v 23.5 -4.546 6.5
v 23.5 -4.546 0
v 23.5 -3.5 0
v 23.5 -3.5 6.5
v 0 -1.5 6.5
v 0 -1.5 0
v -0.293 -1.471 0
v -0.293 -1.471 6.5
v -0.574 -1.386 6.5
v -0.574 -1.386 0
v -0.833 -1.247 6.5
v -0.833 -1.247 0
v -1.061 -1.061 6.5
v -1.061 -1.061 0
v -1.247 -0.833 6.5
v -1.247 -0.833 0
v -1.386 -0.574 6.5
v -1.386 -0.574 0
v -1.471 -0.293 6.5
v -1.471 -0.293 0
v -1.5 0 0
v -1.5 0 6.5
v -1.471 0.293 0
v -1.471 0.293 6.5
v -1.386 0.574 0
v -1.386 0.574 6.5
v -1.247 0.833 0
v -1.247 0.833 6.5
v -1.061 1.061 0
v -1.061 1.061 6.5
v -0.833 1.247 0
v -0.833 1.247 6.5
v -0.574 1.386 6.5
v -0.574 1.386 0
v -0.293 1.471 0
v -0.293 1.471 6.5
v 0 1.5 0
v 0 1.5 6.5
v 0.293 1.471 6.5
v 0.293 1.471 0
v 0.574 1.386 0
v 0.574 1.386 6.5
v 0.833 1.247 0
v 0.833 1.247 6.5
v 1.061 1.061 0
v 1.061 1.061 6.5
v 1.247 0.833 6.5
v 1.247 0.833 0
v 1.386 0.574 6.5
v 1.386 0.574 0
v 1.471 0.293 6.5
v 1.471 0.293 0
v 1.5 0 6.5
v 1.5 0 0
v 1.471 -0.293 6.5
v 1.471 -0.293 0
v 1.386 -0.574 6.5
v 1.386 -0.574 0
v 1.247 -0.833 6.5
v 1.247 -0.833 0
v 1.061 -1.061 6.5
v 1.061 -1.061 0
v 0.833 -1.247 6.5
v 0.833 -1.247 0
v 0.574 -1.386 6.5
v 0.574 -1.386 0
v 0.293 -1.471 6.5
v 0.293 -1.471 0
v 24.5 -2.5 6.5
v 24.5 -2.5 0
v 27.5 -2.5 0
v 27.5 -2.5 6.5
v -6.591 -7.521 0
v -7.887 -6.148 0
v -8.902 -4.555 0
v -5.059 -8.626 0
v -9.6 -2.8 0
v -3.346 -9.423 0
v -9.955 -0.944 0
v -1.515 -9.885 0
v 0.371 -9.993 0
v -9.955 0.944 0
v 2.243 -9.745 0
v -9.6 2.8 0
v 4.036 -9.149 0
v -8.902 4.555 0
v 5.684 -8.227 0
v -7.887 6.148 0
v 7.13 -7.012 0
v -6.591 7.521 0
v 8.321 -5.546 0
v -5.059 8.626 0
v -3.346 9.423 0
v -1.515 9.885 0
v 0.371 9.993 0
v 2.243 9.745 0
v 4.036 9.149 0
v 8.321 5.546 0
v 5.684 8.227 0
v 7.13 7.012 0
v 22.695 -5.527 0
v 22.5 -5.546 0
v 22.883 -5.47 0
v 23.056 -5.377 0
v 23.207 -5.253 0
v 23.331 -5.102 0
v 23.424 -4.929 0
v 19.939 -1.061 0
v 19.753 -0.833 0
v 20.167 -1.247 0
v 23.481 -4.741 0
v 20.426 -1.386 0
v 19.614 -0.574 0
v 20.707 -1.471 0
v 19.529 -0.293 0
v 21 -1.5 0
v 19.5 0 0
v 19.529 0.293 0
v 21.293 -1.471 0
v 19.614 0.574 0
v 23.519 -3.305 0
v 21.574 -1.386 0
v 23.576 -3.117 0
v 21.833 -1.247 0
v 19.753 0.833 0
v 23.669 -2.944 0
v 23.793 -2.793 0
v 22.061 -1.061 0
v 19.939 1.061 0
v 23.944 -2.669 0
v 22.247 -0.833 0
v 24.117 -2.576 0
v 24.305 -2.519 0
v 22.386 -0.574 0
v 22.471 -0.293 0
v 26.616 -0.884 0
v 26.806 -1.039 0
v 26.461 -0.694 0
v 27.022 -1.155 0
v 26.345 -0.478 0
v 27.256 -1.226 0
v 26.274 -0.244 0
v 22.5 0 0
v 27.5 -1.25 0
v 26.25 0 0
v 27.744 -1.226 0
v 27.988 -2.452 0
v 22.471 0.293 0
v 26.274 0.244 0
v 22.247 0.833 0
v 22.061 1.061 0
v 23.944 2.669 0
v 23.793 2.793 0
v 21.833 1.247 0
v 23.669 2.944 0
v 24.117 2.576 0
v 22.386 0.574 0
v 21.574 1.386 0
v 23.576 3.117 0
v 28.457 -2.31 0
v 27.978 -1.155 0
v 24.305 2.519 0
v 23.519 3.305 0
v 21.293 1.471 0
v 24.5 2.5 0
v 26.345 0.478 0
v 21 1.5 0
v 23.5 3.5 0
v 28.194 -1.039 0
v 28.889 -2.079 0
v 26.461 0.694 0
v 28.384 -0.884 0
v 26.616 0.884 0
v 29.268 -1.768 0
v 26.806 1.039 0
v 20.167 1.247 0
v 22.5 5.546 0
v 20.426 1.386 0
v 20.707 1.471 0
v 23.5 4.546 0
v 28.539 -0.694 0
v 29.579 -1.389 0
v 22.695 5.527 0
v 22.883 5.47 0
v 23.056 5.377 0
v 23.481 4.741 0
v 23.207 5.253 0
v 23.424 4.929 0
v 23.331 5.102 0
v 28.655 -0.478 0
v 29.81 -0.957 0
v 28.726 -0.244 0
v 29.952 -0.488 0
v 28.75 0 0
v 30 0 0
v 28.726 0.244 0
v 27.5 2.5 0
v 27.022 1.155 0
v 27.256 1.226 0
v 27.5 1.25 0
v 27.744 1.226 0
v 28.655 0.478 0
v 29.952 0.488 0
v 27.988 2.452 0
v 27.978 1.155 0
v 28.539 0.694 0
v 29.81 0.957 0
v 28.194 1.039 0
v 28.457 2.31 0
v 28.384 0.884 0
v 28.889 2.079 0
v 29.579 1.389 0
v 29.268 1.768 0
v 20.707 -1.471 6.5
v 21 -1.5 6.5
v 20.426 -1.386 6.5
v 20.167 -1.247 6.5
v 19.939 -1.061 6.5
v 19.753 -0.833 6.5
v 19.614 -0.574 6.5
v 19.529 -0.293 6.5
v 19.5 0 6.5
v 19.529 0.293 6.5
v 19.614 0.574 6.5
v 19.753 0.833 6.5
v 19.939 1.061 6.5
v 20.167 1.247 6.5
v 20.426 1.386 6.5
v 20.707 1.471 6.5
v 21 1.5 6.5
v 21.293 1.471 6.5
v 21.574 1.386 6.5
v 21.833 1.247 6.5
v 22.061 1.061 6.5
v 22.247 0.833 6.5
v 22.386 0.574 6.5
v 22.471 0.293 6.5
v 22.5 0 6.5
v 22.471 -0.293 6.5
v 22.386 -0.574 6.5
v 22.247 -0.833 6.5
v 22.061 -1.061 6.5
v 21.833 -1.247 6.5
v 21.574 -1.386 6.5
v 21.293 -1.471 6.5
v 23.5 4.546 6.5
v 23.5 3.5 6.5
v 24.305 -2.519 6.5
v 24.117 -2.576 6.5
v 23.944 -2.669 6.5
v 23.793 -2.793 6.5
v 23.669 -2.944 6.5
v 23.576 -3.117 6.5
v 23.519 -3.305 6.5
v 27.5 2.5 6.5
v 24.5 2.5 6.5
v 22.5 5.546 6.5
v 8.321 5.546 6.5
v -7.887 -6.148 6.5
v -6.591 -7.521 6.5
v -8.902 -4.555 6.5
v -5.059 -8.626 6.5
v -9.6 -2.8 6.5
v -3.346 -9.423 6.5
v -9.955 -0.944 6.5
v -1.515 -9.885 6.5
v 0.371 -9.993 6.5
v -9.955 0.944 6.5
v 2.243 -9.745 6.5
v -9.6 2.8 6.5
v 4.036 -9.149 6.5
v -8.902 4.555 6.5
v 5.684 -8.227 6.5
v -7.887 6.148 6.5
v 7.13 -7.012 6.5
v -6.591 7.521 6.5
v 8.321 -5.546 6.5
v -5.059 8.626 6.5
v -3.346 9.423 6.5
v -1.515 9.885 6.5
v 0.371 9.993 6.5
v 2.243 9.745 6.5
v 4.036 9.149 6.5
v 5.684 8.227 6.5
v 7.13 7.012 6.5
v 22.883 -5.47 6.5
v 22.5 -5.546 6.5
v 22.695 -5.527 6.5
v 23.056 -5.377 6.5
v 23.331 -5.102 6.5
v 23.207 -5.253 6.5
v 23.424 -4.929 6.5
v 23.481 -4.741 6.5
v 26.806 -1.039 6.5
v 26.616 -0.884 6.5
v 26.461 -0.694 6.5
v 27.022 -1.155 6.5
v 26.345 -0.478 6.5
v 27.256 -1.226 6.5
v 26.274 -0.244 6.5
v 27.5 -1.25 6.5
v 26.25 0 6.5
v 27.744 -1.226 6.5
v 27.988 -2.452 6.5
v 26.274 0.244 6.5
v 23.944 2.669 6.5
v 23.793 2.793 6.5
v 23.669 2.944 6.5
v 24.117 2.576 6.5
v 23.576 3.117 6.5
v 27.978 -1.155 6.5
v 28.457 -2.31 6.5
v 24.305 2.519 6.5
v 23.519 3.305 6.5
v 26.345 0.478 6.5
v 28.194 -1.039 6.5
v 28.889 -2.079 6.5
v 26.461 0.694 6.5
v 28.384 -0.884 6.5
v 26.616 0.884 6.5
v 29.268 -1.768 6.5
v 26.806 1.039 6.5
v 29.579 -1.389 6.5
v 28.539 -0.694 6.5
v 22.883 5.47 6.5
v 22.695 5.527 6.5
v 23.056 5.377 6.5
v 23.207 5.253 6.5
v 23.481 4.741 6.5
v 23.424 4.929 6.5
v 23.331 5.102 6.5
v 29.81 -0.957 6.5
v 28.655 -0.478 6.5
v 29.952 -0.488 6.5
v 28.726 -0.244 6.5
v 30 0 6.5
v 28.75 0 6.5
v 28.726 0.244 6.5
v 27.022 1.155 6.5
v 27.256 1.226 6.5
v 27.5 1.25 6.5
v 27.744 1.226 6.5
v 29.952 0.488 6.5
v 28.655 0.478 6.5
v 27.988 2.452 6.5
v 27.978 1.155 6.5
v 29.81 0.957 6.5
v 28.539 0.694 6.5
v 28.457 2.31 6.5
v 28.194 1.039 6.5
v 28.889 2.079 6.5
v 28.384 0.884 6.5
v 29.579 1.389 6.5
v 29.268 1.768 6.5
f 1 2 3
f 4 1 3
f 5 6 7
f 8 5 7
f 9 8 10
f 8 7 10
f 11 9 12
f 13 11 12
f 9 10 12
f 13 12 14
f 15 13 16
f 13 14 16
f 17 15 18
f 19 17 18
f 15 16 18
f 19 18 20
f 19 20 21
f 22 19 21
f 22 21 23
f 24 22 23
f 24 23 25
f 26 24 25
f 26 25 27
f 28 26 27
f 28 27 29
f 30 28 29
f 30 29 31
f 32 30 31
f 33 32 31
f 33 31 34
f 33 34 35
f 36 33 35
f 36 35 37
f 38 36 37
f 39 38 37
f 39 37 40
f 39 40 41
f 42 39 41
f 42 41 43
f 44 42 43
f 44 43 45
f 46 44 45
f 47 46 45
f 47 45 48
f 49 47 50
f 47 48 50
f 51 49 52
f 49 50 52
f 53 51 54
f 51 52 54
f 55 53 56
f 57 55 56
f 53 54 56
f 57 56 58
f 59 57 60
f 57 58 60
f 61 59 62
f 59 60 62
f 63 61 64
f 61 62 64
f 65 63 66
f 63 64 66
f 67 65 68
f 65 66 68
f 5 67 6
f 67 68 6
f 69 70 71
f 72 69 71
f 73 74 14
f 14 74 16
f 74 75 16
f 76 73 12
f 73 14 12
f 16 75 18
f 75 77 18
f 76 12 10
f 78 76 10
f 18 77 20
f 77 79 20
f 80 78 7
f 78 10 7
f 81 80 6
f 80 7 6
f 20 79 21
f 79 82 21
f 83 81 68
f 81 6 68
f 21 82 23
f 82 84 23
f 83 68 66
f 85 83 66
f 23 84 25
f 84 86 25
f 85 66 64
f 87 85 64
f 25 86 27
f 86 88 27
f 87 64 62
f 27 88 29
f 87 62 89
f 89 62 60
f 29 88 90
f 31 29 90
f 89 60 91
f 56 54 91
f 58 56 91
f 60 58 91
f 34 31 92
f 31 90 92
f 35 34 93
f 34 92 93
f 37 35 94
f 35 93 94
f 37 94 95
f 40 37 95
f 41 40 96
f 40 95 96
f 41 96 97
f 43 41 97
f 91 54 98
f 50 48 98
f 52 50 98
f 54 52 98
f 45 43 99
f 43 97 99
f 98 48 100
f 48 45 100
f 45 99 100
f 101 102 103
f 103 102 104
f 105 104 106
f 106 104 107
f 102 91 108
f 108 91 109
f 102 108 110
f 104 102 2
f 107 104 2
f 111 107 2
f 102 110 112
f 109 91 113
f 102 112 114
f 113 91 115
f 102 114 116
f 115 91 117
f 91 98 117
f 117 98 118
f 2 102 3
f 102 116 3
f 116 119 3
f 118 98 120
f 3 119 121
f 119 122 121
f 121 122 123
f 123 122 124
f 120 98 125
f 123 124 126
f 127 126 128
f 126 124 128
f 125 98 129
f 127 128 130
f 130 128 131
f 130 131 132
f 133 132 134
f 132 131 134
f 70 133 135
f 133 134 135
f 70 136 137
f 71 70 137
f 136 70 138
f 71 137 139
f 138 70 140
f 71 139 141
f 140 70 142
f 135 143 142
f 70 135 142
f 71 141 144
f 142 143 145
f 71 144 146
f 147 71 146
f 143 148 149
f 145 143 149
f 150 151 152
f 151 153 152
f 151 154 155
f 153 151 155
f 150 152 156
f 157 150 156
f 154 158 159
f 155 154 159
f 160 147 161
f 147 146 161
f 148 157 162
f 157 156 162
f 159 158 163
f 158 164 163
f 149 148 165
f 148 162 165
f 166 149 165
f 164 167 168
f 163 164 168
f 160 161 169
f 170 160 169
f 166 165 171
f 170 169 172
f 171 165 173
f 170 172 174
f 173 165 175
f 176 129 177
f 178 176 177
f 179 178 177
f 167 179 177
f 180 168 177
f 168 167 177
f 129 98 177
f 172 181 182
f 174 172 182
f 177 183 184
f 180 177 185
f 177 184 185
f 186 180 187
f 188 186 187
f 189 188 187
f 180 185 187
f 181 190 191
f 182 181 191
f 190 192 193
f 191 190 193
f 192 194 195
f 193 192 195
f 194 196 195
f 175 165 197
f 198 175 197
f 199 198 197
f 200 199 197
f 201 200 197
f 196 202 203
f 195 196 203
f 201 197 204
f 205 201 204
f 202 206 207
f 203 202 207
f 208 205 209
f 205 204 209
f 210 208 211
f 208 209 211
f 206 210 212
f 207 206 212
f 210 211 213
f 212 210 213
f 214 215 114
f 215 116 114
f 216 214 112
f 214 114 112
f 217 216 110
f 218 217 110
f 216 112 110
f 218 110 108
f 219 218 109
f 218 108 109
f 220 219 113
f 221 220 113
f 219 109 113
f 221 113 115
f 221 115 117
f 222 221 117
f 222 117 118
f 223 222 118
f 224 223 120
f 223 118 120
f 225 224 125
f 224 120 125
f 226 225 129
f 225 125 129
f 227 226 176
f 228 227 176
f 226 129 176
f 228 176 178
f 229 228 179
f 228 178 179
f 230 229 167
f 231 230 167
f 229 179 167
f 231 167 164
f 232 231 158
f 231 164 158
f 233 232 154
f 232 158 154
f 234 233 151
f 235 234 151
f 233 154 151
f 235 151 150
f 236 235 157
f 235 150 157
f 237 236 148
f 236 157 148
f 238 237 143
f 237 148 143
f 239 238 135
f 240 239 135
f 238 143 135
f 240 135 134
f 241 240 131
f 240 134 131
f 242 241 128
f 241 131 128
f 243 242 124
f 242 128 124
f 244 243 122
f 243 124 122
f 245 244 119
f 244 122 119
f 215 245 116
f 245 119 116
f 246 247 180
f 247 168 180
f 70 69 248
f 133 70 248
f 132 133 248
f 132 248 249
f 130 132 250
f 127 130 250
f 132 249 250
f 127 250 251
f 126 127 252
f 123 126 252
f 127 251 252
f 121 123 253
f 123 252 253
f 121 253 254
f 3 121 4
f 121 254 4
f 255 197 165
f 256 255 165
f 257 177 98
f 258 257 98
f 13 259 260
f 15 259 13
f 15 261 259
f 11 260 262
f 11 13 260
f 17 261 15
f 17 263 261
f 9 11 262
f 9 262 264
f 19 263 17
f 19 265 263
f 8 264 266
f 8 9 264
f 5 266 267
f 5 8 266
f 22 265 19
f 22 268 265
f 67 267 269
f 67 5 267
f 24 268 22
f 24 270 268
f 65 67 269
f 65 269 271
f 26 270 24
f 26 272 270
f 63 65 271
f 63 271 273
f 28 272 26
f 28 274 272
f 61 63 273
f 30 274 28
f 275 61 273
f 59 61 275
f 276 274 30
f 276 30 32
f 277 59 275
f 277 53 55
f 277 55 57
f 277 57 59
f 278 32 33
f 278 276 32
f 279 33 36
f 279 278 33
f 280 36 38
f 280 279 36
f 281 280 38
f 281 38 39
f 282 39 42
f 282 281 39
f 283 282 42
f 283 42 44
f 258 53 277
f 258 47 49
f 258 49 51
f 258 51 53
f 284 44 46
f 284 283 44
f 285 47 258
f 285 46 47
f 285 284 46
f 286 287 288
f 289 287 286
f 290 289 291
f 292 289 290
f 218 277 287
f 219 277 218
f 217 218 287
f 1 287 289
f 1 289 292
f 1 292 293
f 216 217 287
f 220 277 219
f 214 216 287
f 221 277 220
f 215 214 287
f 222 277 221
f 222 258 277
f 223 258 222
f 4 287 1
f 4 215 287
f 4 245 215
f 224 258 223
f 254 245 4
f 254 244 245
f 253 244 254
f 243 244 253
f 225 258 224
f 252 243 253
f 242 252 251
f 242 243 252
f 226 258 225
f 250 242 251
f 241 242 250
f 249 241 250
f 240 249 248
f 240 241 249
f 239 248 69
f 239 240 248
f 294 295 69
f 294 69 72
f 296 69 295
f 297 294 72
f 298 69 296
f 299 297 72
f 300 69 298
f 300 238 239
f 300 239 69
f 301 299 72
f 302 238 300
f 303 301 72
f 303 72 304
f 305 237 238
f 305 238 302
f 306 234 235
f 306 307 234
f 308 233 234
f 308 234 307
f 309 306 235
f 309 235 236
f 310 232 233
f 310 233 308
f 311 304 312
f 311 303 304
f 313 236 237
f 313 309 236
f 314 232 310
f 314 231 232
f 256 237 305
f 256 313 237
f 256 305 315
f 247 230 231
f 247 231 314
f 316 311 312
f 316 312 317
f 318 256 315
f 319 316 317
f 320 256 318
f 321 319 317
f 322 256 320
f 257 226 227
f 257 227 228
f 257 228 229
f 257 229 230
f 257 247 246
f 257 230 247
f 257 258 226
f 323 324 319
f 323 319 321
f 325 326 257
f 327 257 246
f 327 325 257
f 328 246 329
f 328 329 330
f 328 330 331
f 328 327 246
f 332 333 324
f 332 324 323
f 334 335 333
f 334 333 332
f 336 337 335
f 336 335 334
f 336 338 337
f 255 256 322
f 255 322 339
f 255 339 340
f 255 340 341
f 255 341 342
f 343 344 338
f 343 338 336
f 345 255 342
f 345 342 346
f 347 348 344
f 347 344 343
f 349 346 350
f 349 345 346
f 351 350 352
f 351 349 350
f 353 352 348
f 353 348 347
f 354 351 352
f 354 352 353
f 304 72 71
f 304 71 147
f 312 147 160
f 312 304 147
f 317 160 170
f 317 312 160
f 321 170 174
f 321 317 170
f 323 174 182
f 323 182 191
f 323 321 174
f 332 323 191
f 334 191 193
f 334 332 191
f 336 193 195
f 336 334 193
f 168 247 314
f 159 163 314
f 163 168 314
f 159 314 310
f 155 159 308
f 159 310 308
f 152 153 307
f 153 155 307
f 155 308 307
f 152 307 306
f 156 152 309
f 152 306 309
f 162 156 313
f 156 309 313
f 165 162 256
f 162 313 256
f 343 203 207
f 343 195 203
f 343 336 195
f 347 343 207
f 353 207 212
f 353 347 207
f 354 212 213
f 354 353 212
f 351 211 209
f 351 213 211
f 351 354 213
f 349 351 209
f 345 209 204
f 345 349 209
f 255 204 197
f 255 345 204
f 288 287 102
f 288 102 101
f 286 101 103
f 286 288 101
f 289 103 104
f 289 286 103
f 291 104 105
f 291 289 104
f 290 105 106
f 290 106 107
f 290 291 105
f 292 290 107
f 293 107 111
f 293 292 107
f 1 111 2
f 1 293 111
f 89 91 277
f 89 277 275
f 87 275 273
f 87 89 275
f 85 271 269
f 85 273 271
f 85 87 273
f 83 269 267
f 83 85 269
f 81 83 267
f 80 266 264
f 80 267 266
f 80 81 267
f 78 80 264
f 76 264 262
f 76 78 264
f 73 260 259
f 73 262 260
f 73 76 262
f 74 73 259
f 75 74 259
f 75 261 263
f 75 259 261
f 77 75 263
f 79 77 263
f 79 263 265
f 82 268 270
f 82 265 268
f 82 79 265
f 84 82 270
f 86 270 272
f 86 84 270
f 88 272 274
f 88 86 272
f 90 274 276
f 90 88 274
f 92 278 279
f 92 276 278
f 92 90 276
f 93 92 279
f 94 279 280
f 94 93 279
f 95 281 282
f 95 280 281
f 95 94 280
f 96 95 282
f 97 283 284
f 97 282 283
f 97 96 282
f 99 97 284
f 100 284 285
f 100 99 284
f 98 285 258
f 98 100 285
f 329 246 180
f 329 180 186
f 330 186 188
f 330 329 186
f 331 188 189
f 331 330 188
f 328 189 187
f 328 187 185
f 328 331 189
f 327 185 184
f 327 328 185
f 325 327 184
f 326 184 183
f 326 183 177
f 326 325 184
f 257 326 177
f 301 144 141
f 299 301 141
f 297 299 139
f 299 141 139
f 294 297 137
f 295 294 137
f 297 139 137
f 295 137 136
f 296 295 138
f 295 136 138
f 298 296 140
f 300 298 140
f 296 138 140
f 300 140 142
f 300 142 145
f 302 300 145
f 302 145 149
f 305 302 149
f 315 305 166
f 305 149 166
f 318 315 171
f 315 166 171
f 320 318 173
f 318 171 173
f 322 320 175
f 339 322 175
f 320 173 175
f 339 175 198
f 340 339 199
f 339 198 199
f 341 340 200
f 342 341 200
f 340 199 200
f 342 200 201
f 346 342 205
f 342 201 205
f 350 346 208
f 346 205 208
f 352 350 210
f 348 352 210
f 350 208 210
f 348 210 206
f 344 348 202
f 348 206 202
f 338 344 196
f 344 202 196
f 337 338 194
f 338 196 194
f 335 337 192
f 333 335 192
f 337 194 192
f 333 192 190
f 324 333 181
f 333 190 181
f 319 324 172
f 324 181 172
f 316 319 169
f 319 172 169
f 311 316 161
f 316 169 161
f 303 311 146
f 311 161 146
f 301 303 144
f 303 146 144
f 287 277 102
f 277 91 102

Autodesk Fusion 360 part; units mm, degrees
sketch "Sketch1" plane through (0, 0, 0) normal (0, 0, 1) x (1, 0, 0)
  circle A0 centre (0, 0) radius 10
extrude "Extrude1" add sketch "Sketch1" along normal blind 6.5
sketch "Sketch2" plane through (0, 0, 0) normal (0, 0, -1) x (1, 0, 0)
  circle A0 centre (0, 0) radius 10
  line L0 (0, 2.5) -> (30, 2.5)
  line L1 (30, 2.5) -> (30, -2.5)
  line L2 (30, -2.5) -> (0, -2.5)
  line L3 (0, -2.5) -> (0, 2.5)
  line L4 (0, 2.5) -> (30, -2.5) construction
  line L5 (30, 2.5) -> (0, -2.5) construction
  line L6 (15, 0) -> (0, 0) construction
  point P0 (15, 0)
  dimension "d19" = 5
  dimension "d20" = 30
extrude "Extrude2" add sketch "Sketch2" against normal up to surface (6.5 mm away) contours A0 L0 L1 L2
hole "Hole1" at (0, 0, 6.5) direction (0, 0, -1) diameter 3 end through all
fillet "Fillet1" radius 2.5 2 edges at (30, -2.5, 3.25) (30, 2.5, 3.25)
hole "Hole2" at (27.5, 0, 6.5) direction (0, 0, -1) diameter 2.5 end through all
sketch "Sketch4" plane through (0, 0, 0) normal (0, 0, -1) x (1, 0, 0)
  circle A0 centre (27.5, 0) radius 1.25
  circle A1 centre (0, 0) radius 1.5
  arc A2 (27.5, -2.5) -> (27.5, 2.5) centre (27.5, 0) ccw
  line L0 (27.5, 2.5) -> (9.6825, 2.5)
  arc A3 (9.6825, 2.5) -> (9.6825, -2.5) centre (0, 0) ccw
  line L1 (9.6825, -2.5) -> (27.5, -2.5)
  line L2 (1.5, 5.546) -> (23.5, 5.546)
  line L3 (23.5, 5.546) -> (23.5, -5.546)
  line L4 (23.5, -5.546) -> (1.5, -5.546)
  line L5 (1.5, -5.546) -> (1.5, 5.546)
  line L6 (1.5, 5.546) -> (23.5, -5.546) construction
  line L7 (23.5, 5.546) -> (1.5, -5.546) construction
  line L8 (12.5, 0) -> (23.5, 0) construction
  point P0 (12.5, 0)
  dimension "d35" = 4
extrude "Extrude4" add sketch "Sketch4" against normal up to surface (6.5 mm away) contours A3 L1 L3 L4 | L0 A3 L2 L3
sketch "Sketch6" plane through (0, 0, 6.5) normal (0, 0, 1) x (-1, 0, 0)
  line L0 (-23.5, 5.546) -> (-23.5, 2.5)
  line L1 (-23.5, 2.5) -> (-27.5, 2.5)
  arc A0 (-27.5, 2.5) -> (-27.5, -2.5) centre (-27.5, 0) ccw
  line L2 (-27.5, -2.5) -> (-23.5, -2.5)
  line L3 (-23.5, -2.5) -> (-23.5, -5.546)
  line L4 (-23.5, -5.546) -> (-8.3212, -5.546)
  arc A1 (-8.3212, -5.546) -> (-8.3212, 5.546) centre (0, 0) ccw
  line L5 (-8.3212, 5.546) -> (-23.5, 5.546)
  circle A2 centre (-27.5, 0) radius 1.25
  circle A3 centre (0, 0) radius 1.5
  circle A4 centre (-21, 0) radius 1
  dimension "d36" = 2.5
fillet "Fillet2" radius 1 4 edges at (23.5, 5.546, 3.25) (23.5, -5.546, 3.25) (23.5, 2.5, 3.25) (23.5, -2.5, 3.25)
hole "Hole4" at (21, 0, 6.5) direction (0, 0, -1) diameter 3 end through all
